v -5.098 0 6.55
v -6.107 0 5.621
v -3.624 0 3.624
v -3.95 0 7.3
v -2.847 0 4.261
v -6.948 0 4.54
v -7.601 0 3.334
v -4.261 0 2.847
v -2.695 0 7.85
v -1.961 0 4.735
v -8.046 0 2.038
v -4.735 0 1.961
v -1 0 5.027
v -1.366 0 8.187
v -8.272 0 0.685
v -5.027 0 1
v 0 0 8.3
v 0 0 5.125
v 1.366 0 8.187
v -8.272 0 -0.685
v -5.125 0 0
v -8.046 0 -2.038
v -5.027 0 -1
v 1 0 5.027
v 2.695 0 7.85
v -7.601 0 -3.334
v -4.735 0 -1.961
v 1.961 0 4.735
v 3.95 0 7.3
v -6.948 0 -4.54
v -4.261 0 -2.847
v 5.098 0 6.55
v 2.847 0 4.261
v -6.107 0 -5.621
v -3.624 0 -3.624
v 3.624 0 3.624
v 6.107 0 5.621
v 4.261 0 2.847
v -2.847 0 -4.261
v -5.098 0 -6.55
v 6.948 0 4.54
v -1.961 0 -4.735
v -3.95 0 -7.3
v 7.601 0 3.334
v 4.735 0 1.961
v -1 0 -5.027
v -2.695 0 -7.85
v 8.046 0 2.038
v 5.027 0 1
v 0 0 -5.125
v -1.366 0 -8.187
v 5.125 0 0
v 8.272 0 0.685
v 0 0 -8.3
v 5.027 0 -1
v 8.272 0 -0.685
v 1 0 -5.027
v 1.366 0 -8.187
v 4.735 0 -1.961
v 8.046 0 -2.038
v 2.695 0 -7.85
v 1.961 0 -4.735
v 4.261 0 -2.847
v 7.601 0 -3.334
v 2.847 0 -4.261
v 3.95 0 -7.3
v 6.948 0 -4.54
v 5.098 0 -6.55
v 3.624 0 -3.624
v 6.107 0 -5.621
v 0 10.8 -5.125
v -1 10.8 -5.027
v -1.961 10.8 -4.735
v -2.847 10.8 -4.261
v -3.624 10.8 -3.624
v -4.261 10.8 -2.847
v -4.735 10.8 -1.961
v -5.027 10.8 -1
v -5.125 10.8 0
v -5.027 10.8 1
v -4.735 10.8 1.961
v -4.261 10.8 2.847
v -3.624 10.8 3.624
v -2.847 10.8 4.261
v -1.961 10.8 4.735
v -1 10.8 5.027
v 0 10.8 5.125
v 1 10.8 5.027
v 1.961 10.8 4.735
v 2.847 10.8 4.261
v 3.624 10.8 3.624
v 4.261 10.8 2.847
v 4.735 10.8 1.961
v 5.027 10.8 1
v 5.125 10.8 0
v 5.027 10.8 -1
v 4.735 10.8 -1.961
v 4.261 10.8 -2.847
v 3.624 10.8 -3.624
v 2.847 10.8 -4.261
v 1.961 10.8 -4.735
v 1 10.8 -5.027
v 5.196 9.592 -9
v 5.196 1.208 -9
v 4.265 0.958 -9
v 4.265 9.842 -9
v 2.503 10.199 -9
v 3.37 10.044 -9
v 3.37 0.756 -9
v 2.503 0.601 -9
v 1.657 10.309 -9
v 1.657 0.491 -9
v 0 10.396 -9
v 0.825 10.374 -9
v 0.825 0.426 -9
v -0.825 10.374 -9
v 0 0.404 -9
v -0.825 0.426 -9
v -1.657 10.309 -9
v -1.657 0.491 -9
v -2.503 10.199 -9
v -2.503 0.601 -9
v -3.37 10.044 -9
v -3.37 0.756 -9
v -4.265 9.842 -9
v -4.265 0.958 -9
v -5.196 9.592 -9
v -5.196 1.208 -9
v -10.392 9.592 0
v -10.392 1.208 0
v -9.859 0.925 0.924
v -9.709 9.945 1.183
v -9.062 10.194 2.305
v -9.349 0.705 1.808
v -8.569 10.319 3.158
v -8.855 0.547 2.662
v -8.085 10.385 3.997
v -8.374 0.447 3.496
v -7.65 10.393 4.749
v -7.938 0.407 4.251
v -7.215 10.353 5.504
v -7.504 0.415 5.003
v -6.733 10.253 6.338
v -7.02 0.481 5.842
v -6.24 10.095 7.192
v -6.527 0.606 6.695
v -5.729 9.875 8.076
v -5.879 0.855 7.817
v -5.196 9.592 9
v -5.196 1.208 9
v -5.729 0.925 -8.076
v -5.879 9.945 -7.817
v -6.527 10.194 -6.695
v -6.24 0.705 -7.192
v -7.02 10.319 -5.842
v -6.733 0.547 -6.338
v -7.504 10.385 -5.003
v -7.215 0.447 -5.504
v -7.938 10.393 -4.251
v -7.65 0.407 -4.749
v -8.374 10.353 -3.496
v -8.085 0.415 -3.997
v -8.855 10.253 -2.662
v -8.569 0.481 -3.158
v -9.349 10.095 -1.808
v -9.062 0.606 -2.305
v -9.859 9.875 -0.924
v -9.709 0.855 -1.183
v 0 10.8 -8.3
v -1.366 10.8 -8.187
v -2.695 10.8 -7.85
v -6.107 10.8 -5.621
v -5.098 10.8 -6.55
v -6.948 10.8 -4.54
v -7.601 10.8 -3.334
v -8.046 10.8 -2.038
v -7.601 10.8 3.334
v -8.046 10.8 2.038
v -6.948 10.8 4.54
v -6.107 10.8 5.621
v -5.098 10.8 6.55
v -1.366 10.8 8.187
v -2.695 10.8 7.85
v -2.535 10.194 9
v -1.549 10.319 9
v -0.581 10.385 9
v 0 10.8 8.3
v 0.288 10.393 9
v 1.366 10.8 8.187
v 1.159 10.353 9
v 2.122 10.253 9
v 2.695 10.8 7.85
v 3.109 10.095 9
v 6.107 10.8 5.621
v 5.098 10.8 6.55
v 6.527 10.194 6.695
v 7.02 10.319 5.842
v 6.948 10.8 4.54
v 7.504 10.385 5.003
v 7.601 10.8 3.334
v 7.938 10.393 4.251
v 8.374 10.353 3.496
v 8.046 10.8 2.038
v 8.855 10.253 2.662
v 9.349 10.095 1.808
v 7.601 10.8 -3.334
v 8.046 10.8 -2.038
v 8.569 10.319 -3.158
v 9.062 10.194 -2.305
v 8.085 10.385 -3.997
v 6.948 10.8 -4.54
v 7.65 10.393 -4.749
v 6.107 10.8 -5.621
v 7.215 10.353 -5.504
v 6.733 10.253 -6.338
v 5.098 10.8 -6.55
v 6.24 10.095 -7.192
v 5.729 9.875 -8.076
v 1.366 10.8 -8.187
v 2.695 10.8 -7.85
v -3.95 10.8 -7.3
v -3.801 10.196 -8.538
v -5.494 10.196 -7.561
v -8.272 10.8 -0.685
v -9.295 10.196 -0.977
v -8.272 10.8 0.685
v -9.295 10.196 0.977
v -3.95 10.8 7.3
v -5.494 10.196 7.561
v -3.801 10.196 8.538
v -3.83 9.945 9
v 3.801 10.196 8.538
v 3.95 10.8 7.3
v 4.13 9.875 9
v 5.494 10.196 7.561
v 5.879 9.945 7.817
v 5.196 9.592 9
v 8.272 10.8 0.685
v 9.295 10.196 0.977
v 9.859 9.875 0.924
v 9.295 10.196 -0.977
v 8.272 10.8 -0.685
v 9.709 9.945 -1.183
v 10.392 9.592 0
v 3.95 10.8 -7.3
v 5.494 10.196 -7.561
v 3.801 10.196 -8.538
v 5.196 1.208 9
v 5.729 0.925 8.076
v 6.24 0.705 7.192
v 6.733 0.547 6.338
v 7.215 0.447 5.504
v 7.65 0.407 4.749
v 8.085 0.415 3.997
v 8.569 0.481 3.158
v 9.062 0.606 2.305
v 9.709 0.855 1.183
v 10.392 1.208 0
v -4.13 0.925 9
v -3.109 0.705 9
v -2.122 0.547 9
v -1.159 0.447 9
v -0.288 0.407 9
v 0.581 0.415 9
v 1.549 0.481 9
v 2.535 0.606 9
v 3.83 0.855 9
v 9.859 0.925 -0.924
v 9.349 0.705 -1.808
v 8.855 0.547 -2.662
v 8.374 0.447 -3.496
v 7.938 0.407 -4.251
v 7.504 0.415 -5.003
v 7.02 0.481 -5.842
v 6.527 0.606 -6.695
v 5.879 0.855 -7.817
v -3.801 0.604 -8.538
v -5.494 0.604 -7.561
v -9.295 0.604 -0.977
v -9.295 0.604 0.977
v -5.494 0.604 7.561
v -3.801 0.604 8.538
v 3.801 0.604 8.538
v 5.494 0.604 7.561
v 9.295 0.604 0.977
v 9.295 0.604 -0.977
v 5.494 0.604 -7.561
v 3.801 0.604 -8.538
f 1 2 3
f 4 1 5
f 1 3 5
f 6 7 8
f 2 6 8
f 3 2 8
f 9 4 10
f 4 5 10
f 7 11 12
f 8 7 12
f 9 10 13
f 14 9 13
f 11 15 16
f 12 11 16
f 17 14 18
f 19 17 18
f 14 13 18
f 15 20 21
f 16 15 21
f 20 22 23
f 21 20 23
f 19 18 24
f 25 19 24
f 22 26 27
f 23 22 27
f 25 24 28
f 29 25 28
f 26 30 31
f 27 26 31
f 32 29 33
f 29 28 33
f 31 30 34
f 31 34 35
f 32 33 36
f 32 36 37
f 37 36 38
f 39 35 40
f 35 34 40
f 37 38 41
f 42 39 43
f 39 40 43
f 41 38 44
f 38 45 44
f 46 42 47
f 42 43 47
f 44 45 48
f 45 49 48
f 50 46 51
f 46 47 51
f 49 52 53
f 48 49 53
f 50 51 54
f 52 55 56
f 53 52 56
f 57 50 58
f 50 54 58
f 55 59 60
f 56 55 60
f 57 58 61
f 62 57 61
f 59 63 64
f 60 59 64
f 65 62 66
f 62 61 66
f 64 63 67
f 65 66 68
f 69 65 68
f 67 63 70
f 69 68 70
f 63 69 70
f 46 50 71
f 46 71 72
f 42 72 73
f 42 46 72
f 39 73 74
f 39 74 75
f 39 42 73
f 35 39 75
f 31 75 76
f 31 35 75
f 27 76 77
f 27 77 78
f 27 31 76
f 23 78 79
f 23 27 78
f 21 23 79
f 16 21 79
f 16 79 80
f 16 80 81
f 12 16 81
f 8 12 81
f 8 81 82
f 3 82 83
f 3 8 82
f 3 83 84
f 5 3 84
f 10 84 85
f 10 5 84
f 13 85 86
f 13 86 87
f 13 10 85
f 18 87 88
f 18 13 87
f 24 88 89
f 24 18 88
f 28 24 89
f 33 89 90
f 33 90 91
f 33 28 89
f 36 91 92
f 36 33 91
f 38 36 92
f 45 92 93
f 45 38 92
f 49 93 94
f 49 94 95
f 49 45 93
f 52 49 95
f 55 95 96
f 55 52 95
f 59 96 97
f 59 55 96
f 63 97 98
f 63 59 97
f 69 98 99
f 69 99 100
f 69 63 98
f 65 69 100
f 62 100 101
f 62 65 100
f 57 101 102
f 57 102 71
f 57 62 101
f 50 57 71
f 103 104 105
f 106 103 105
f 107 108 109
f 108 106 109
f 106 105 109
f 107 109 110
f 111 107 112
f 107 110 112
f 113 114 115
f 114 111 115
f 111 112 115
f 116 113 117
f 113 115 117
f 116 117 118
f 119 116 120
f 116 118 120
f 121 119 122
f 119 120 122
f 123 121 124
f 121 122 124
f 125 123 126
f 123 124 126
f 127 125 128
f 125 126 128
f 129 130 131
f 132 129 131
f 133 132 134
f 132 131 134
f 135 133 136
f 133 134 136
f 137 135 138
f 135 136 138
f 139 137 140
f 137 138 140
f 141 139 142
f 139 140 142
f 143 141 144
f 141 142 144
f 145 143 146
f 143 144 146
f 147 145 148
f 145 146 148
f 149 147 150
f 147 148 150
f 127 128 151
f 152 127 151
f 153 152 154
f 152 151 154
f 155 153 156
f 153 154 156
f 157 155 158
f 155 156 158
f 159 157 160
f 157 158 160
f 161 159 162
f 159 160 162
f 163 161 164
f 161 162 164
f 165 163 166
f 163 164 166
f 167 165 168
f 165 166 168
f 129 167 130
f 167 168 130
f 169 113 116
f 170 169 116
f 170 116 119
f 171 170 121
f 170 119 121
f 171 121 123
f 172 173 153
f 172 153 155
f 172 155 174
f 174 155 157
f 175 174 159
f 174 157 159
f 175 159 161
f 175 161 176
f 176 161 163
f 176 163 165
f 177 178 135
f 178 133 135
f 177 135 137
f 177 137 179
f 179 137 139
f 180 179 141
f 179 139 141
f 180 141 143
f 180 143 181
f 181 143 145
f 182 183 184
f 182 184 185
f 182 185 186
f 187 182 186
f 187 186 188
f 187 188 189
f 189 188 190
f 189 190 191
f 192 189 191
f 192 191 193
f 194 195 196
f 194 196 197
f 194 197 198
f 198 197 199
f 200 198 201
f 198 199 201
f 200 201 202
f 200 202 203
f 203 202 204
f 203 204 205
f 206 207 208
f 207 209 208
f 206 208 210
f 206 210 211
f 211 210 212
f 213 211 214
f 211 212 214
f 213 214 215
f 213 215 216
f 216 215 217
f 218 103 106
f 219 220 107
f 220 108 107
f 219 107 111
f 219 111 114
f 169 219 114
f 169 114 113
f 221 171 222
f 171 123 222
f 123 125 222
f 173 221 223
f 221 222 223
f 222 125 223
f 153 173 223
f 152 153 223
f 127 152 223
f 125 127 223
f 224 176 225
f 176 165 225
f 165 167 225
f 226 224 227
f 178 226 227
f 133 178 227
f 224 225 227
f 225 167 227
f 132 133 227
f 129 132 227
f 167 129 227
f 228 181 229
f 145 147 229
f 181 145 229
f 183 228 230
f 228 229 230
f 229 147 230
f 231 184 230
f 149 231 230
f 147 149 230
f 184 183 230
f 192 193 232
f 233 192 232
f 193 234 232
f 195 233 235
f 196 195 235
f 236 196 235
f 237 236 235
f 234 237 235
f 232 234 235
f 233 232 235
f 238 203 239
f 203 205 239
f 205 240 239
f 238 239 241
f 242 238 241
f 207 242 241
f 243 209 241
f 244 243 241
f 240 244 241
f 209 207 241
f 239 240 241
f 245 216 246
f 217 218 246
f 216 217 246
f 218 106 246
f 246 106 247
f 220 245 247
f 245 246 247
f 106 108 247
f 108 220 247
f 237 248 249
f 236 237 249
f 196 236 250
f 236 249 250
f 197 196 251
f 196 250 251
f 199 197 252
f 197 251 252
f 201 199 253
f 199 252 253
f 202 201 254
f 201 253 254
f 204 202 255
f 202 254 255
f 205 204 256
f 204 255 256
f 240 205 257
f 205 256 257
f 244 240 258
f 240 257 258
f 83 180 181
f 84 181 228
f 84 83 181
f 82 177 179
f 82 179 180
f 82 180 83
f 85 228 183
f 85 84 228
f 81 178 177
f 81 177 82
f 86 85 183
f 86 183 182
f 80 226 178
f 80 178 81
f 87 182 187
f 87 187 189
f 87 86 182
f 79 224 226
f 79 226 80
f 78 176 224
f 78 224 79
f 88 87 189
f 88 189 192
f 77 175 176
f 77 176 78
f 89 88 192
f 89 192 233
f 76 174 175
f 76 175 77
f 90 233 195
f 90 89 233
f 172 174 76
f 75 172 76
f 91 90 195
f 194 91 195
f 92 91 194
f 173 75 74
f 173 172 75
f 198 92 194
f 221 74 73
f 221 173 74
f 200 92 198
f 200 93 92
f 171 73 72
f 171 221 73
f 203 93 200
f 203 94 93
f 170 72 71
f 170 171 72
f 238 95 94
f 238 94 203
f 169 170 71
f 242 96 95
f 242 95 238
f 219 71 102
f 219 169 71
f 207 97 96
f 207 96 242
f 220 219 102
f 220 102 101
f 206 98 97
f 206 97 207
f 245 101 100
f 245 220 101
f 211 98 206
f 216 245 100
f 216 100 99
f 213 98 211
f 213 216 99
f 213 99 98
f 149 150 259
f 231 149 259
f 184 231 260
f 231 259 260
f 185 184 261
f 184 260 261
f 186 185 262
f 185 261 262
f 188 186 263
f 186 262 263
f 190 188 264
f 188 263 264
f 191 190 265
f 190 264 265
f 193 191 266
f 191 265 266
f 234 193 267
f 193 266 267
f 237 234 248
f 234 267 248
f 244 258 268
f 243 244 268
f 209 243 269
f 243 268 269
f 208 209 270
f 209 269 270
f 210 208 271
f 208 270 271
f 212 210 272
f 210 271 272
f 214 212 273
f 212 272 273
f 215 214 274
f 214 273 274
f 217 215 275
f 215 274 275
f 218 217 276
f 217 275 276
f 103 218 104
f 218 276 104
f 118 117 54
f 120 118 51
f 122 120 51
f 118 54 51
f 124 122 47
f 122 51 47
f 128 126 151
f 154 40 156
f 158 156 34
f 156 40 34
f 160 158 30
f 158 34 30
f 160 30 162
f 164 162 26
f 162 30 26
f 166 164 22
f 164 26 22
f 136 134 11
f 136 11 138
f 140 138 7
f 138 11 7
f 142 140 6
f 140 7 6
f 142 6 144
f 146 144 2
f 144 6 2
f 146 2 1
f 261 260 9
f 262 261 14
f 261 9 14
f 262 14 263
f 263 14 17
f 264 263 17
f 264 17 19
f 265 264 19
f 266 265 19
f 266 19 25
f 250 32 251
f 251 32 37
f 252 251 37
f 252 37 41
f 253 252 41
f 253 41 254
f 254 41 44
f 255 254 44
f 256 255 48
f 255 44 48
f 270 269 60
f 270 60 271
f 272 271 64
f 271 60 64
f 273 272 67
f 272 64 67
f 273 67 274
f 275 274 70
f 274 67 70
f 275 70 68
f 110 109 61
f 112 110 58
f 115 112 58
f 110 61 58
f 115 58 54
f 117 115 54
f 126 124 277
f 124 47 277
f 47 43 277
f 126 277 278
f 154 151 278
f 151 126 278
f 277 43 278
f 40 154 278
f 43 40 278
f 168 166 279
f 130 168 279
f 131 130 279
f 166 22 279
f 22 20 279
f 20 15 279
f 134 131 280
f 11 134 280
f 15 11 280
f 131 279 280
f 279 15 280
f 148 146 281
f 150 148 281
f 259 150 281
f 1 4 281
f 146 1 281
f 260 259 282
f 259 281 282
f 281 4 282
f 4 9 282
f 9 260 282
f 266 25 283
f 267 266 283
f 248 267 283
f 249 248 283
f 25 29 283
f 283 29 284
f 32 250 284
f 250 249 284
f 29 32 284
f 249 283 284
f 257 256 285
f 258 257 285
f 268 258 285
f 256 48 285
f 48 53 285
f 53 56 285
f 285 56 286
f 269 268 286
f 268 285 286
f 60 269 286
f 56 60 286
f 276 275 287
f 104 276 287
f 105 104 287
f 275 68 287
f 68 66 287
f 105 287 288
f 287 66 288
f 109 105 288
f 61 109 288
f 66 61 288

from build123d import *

# Parameters (mm, degrees)
SKETCH1_R      = 5.125
EXTRUDE1_DEPTH = 10.8


with BuildPart() as part:
    # Sketch1 → Extrude1 (new body)
    with BuildSketch(Plane(origin=(0, 0, 0), x_dir=(1, 0, 0), z_dir=(0, 1, 0))):
        Polygon((10.392304845, 0), (5.196152423, 9), (-5.196152423, 9), (-10.392304845, 0), (-5.196152423, -9), (5.196152423, -9), align=None)
        with Locations(Location((0, 0, 0), (0, 0, 90))):
            Circle(SKETCH1_R, mode=Mode.SUBTRACT)
    extrude(amount=EXTRUDE1_DEPTH)

    # Sketch2 → Cut-Revolve1 (revolve, cut)
    with BuildSketch(Plane.XY, mode=Mode.PRIVATE) as cut_revolve1_sk:
        Polygon((-8.3, 10.8), (-10.392304845, 9.592007234), (-10.392304845, 10.8), align=None)
        Polygon((-10.392304845, 1.207992766), (-8.3, 0), (-10.392304845, 0), align=None)
    revolve(cut_revolve1_sk.sketch.rotate(Axis((0, 0, 0), (0, 1, 0)), 270), axis=Axis((0, 0, 0), (0, 1, 0)), mode=Mode.SUBTRACT)


solid = part.part
